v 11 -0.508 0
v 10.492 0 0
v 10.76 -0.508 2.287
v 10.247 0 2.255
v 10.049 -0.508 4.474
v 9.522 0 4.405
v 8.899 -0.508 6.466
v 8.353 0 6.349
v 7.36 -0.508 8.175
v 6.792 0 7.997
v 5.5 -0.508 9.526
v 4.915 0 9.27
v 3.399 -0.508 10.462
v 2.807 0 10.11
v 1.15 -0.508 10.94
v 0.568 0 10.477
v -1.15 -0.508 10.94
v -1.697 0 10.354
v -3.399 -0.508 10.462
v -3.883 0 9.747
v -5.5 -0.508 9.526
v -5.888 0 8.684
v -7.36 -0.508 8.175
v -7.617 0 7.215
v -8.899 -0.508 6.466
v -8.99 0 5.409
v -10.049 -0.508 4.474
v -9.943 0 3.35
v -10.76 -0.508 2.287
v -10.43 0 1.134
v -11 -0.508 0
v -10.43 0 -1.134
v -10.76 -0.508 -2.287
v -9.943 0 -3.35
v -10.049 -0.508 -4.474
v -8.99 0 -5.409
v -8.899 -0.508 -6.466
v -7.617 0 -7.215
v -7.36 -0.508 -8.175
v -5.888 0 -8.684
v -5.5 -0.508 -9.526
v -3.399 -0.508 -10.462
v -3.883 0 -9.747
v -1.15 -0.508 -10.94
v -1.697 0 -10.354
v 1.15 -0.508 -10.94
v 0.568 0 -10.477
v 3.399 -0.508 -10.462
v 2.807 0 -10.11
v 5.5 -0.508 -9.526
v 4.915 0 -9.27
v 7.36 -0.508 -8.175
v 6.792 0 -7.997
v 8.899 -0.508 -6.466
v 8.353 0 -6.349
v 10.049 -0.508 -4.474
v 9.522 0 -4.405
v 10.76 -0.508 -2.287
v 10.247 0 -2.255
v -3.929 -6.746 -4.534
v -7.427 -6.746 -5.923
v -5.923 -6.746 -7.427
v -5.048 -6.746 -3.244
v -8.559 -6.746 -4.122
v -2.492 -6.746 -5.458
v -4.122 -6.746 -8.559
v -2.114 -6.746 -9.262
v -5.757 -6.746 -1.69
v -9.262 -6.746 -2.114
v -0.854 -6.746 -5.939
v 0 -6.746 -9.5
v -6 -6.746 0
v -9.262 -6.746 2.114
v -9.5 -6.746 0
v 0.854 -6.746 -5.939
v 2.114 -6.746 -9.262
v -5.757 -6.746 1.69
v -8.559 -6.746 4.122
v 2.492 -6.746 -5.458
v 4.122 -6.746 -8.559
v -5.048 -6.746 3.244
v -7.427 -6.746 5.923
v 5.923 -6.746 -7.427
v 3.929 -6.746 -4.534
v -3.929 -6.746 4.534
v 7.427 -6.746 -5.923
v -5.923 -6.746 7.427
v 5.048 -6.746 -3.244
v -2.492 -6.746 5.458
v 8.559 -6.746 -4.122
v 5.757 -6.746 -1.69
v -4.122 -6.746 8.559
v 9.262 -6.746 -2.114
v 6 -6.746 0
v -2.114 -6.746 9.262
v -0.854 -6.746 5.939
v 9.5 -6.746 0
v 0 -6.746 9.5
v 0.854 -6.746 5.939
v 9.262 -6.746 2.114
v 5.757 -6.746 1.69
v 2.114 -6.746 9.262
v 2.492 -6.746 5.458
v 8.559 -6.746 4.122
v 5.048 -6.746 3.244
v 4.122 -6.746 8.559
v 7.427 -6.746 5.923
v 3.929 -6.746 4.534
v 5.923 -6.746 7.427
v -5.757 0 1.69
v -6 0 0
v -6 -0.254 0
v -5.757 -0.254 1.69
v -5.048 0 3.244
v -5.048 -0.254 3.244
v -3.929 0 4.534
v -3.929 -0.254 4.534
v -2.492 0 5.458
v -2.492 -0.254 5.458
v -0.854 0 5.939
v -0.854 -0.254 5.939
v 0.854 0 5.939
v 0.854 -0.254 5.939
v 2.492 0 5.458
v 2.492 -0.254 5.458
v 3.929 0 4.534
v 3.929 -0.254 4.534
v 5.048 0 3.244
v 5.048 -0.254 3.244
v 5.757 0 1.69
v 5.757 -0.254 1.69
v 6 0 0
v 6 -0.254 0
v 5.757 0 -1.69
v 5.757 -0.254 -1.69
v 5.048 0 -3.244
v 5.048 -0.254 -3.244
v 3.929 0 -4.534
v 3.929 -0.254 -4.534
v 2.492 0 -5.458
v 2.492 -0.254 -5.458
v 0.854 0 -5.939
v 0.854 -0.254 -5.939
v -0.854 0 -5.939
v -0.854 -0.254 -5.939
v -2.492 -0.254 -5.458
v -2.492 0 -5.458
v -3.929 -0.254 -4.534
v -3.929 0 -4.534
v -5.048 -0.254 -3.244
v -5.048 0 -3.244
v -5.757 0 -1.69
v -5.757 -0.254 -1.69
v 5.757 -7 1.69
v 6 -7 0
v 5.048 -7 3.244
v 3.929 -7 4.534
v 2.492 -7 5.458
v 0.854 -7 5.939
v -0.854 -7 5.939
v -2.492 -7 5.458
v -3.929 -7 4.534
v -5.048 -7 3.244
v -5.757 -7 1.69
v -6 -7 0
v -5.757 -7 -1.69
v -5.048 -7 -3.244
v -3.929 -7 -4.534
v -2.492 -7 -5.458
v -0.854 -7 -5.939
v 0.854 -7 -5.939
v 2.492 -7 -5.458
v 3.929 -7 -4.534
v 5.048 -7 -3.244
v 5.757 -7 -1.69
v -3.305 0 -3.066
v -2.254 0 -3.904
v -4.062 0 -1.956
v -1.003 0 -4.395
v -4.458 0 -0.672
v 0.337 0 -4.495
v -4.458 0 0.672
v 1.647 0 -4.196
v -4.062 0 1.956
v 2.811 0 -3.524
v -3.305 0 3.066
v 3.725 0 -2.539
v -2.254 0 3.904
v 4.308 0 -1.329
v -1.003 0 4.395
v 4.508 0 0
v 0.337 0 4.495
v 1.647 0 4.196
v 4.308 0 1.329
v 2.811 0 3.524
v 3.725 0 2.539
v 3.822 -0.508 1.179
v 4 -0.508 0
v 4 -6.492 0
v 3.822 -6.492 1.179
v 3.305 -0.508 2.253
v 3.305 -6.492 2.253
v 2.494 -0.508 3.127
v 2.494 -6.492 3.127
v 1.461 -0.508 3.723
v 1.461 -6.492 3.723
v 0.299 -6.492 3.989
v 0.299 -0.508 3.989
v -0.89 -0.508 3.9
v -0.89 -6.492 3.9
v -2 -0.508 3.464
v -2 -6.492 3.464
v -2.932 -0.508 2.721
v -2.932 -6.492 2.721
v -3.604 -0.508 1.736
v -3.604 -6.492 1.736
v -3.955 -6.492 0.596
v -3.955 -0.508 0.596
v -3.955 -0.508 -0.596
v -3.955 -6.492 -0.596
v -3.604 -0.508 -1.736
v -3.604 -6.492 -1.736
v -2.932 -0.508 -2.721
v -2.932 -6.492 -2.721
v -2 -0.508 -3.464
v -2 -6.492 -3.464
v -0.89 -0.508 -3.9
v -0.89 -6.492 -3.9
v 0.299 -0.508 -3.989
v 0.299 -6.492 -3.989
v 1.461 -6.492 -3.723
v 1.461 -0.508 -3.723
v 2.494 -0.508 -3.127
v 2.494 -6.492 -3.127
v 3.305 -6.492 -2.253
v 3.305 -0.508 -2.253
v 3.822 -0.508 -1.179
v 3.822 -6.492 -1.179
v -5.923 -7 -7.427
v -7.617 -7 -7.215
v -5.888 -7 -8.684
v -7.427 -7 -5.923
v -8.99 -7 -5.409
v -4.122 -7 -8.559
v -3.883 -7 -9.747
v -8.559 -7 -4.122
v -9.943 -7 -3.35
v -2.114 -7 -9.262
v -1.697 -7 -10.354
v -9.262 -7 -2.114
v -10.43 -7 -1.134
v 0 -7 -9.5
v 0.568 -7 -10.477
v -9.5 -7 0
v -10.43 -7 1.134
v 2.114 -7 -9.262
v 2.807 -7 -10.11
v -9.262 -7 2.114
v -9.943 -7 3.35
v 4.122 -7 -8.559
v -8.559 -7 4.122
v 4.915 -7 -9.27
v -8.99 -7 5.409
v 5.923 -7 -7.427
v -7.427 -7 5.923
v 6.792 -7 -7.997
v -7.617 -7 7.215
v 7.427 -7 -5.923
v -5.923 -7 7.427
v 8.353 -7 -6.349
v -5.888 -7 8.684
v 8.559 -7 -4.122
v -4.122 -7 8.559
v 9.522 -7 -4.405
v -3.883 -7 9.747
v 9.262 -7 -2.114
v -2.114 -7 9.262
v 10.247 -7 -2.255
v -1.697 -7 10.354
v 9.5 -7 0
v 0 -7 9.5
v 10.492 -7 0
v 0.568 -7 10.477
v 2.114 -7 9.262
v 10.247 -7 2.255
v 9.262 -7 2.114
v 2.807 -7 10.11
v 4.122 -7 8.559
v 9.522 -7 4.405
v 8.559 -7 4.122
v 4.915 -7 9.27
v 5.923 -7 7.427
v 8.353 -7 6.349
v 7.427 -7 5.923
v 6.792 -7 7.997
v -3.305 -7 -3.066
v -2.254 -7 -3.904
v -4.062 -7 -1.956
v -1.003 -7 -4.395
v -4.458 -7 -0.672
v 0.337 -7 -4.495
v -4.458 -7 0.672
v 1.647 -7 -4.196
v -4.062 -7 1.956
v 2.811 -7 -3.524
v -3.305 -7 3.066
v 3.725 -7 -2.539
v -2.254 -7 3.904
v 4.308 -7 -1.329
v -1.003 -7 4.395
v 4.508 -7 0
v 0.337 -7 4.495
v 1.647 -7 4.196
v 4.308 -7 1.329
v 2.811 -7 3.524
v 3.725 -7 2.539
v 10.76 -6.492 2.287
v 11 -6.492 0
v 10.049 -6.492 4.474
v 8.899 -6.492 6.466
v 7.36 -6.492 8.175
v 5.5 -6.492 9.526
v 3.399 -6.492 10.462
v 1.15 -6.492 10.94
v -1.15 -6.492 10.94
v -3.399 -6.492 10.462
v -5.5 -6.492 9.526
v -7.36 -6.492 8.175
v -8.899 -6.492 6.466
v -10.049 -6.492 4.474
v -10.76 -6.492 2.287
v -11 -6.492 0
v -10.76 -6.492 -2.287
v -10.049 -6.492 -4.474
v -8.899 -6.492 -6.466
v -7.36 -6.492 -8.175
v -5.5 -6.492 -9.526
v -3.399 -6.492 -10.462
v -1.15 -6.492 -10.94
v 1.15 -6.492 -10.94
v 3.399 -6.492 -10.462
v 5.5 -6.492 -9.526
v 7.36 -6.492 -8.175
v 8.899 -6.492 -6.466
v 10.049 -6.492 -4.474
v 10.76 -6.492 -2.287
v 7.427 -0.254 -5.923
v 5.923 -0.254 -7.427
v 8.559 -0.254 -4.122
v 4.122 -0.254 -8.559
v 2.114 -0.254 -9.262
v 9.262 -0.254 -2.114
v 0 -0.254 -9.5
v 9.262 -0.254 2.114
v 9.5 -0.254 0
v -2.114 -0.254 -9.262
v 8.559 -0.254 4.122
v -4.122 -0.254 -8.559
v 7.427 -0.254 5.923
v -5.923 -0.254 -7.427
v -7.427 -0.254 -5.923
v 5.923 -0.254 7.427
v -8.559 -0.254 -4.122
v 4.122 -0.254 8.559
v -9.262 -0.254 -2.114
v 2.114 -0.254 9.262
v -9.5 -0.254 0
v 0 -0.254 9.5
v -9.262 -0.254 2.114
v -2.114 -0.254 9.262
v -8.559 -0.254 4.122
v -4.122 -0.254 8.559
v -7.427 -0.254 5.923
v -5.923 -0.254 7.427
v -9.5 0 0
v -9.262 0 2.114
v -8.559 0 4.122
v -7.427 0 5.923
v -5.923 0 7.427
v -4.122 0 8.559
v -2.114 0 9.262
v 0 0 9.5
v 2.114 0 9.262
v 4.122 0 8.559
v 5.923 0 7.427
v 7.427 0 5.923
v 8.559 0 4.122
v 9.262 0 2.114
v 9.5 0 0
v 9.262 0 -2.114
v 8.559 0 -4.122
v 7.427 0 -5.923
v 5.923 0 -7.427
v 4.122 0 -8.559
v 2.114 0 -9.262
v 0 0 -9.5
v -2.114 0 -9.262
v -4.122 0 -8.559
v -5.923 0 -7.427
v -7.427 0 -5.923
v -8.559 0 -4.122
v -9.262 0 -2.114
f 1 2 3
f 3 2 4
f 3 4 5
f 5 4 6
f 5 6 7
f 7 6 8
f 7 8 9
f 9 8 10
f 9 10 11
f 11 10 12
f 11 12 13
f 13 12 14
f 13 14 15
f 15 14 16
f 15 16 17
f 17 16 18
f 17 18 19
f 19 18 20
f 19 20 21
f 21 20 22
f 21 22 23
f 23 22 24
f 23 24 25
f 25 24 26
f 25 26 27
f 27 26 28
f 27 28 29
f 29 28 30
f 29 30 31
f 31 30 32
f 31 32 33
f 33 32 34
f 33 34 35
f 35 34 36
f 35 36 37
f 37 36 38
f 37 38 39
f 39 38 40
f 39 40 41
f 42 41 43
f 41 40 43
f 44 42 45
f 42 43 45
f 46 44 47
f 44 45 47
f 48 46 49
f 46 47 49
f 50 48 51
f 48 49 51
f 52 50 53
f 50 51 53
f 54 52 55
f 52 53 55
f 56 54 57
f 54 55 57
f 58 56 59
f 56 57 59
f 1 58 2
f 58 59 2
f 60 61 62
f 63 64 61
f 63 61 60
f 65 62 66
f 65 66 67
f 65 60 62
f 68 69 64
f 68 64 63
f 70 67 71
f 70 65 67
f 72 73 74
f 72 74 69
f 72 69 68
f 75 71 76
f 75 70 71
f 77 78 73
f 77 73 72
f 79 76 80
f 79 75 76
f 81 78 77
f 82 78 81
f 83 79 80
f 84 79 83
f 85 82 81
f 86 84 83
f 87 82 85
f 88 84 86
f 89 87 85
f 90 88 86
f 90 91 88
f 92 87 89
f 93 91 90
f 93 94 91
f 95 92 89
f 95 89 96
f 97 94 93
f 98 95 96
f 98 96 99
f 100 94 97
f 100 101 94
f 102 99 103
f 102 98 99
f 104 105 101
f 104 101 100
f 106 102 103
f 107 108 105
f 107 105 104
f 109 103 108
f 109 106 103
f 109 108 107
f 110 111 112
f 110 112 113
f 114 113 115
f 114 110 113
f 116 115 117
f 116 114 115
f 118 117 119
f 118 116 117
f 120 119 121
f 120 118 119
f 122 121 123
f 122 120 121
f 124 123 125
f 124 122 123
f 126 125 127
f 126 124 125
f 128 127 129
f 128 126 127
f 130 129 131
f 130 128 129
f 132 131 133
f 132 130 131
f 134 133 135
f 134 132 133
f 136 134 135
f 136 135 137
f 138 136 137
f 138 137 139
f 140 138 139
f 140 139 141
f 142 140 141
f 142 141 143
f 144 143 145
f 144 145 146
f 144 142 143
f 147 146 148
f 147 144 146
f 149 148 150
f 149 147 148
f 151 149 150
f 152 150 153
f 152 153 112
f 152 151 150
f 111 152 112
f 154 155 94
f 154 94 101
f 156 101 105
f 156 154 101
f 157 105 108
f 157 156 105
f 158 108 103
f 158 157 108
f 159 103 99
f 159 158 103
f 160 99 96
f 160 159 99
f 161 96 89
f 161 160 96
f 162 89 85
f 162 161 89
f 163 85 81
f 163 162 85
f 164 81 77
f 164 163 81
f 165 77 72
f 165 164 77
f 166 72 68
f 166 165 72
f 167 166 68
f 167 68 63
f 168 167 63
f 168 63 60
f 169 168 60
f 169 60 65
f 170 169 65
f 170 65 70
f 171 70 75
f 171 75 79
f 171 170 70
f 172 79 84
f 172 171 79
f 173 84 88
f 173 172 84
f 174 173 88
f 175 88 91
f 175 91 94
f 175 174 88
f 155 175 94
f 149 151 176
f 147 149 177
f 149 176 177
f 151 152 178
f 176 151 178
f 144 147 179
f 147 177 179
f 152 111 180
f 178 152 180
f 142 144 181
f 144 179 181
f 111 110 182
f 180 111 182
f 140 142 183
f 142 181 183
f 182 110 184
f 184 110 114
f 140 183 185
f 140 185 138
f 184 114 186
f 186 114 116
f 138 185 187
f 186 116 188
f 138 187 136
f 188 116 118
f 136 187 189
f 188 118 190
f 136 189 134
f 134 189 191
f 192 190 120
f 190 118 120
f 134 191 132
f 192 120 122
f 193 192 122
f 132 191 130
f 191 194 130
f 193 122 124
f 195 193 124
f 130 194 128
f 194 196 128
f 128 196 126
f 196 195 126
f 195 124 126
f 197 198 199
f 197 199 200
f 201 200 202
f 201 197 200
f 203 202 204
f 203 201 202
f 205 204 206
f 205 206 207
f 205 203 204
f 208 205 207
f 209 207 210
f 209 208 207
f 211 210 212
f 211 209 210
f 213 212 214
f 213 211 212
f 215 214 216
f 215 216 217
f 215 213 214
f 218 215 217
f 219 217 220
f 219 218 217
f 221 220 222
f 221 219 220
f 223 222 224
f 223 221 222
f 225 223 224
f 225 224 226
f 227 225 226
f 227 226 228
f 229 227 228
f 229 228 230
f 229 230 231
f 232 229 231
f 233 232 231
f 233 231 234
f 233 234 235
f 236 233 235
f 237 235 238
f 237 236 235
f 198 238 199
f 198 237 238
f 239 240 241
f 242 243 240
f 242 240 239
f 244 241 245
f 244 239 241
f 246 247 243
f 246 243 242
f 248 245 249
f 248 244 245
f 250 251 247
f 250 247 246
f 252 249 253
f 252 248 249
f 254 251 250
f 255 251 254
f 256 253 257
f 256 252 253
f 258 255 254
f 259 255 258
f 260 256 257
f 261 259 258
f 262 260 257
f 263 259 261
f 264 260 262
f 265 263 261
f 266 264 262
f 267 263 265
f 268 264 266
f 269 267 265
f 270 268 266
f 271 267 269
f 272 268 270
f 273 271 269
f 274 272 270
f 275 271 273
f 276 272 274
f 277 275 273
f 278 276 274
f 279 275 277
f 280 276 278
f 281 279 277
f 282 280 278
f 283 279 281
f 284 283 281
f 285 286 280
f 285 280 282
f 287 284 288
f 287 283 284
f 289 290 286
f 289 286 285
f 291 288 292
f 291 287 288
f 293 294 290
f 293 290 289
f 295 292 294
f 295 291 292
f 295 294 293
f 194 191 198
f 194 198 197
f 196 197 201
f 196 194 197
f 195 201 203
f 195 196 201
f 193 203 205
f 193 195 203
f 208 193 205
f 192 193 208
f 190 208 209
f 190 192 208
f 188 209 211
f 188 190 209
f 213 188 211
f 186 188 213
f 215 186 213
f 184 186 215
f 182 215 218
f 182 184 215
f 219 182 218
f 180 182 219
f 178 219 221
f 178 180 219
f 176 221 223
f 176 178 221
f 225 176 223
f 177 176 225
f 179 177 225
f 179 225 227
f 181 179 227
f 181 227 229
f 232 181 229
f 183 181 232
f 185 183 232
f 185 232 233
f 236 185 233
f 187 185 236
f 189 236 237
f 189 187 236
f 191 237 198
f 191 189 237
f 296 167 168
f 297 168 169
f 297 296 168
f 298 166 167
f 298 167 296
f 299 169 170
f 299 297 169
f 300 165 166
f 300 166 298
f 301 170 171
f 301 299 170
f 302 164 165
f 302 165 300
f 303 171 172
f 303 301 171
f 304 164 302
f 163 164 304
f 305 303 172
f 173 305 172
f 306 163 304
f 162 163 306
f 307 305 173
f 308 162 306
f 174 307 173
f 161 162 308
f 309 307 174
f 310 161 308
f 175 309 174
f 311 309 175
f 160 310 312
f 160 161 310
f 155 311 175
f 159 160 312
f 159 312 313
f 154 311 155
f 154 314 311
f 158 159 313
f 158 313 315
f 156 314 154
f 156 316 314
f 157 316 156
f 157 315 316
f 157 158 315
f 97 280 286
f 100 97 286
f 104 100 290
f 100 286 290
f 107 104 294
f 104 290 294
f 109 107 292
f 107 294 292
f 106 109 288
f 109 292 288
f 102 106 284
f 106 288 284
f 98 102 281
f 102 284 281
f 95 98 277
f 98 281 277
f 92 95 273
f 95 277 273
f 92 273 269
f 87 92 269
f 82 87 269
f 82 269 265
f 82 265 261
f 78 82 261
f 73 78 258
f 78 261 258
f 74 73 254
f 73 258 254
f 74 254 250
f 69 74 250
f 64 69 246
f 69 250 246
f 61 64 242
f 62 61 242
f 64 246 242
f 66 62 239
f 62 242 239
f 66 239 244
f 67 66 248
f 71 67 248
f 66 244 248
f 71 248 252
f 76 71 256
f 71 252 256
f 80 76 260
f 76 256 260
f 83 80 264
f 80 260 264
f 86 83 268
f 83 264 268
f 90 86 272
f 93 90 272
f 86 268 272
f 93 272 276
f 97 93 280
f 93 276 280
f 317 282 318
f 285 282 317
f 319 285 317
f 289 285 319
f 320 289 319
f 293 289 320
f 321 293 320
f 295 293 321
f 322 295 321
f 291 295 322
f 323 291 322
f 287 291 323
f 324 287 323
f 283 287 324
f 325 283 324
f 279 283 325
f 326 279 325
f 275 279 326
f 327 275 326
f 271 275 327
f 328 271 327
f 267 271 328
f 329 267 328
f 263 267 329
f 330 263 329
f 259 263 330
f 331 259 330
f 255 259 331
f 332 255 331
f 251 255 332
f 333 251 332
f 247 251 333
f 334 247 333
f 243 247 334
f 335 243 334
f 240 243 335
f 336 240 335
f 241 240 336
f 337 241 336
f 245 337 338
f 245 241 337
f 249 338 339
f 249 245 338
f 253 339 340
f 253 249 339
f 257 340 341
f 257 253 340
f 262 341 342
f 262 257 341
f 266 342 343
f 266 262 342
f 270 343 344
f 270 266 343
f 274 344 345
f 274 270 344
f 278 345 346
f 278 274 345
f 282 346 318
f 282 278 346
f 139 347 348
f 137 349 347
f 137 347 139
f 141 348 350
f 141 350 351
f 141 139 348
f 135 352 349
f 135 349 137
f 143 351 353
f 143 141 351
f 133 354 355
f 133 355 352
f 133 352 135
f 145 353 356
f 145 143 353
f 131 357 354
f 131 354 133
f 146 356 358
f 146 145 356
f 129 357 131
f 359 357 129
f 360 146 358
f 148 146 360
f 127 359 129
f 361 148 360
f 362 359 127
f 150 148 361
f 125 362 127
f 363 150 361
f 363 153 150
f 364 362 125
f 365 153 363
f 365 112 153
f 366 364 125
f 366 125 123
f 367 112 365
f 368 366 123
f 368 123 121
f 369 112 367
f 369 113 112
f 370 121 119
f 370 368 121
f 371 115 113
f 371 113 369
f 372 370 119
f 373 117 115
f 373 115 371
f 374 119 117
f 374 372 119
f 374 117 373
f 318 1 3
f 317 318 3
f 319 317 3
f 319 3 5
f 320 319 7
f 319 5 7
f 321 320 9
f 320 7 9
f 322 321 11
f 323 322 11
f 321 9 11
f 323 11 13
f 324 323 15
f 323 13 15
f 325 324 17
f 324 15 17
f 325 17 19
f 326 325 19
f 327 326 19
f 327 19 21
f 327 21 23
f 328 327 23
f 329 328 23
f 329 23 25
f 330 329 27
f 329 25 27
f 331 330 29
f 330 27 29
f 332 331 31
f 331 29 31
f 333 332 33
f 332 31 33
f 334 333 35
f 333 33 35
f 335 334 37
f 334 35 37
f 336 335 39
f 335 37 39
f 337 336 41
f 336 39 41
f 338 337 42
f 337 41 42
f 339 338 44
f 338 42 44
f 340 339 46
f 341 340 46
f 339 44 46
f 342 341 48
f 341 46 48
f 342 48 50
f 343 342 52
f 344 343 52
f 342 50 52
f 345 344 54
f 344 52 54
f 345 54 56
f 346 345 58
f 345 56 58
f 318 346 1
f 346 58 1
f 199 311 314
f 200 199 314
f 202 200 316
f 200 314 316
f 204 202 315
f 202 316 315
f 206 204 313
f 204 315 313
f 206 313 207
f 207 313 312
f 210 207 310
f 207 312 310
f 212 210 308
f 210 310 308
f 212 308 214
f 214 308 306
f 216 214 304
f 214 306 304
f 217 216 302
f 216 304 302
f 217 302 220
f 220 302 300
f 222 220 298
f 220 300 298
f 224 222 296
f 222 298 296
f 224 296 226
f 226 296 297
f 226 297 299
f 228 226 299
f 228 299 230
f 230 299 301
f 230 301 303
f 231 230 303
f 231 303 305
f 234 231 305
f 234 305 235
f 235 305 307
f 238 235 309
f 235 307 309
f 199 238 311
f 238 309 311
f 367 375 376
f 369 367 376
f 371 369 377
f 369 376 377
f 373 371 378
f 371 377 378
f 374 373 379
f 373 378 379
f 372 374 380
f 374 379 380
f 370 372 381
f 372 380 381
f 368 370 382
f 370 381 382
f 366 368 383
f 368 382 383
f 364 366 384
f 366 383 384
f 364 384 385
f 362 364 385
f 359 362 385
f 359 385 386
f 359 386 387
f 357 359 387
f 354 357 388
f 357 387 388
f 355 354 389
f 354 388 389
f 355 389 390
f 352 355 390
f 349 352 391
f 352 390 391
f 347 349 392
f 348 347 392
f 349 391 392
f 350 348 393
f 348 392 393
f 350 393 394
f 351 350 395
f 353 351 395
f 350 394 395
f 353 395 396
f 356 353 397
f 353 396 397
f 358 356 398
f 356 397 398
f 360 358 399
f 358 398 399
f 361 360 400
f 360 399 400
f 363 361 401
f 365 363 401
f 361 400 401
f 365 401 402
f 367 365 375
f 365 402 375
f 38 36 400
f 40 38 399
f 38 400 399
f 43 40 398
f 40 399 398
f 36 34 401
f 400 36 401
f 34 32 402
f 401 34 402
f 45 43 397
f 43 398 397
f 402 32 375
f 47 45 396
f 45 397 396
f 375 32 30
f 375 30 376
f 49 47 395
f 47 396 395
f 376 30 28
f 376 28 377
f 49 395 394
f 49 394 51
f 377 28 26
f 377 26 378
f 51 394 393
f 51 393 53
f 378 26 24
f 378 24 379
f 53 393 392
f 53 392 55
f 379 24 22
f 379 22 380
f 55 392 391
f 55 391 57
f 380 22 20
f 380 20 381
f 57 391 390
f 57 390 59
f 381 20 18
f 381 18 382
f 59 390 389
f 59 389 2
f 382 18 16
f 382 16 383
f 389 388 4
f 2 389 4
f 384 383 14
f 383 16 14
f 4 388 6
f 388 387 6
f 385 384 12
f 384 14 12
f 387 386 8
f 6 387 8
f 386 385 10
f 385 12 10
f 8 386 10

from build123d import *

# Parameters (mm, degrees)
F0_R     = 11
F0_R_2   = 4
F1_DEPTH = 7
F2_SIZE  = 0.508
F3_R     = 9.5
F3_R_2   = 6
F4_DEPTH = 0.254
F5_R     = 9.5
F5_R_2   = 6
F6_DEPTH = 0.254


with BuildPart() as f1:
    # F0 (on Front) → F1 (new body)
    with BuildSketch(Plane.XZ):
        Circle(F0_R)
        Circle(F0_R_2, mode=Mode.SUBTRACT)
    extrude(amount=F1_DEPTH)

    # F2
    f2_edges = [f1.edges().sort_by_distance(p)[0] for p in [
        (11, -3.5, 0),
        (-11, 0, 0),
        (-11, -7, 0),
        (4, -3.5, 0),
        (-4, 0, 0),
        (-4, -7, 0),
    ]]
    chamfer(f2_edges, length=F2_SIZE)

    # F3 (on face) → F4 (cut)
    with BuildSketch(Plane(origin=(0, 0, 0), x_dir=(-1, 0, 0), z_dir=(0, 1, 0))):
        Circle(F3_R)
        Circle(F3_R_2, mode=Mode.SUBTRACT)
    extrude(amount=-F4_DEPTH, mode=Mode.SUBTRACT)

    # F5 (on face) → F6 (cut)
    with BuildSketch(Plane.XZ.offset(7)):
        Circle(F5_R)
        Circle(F5_R_2, mode=Mode.SUBTRACT)
    extrude(amount=-F6_DEPTH, mode=Mode.SUBTRACT)


solid = f1.part
